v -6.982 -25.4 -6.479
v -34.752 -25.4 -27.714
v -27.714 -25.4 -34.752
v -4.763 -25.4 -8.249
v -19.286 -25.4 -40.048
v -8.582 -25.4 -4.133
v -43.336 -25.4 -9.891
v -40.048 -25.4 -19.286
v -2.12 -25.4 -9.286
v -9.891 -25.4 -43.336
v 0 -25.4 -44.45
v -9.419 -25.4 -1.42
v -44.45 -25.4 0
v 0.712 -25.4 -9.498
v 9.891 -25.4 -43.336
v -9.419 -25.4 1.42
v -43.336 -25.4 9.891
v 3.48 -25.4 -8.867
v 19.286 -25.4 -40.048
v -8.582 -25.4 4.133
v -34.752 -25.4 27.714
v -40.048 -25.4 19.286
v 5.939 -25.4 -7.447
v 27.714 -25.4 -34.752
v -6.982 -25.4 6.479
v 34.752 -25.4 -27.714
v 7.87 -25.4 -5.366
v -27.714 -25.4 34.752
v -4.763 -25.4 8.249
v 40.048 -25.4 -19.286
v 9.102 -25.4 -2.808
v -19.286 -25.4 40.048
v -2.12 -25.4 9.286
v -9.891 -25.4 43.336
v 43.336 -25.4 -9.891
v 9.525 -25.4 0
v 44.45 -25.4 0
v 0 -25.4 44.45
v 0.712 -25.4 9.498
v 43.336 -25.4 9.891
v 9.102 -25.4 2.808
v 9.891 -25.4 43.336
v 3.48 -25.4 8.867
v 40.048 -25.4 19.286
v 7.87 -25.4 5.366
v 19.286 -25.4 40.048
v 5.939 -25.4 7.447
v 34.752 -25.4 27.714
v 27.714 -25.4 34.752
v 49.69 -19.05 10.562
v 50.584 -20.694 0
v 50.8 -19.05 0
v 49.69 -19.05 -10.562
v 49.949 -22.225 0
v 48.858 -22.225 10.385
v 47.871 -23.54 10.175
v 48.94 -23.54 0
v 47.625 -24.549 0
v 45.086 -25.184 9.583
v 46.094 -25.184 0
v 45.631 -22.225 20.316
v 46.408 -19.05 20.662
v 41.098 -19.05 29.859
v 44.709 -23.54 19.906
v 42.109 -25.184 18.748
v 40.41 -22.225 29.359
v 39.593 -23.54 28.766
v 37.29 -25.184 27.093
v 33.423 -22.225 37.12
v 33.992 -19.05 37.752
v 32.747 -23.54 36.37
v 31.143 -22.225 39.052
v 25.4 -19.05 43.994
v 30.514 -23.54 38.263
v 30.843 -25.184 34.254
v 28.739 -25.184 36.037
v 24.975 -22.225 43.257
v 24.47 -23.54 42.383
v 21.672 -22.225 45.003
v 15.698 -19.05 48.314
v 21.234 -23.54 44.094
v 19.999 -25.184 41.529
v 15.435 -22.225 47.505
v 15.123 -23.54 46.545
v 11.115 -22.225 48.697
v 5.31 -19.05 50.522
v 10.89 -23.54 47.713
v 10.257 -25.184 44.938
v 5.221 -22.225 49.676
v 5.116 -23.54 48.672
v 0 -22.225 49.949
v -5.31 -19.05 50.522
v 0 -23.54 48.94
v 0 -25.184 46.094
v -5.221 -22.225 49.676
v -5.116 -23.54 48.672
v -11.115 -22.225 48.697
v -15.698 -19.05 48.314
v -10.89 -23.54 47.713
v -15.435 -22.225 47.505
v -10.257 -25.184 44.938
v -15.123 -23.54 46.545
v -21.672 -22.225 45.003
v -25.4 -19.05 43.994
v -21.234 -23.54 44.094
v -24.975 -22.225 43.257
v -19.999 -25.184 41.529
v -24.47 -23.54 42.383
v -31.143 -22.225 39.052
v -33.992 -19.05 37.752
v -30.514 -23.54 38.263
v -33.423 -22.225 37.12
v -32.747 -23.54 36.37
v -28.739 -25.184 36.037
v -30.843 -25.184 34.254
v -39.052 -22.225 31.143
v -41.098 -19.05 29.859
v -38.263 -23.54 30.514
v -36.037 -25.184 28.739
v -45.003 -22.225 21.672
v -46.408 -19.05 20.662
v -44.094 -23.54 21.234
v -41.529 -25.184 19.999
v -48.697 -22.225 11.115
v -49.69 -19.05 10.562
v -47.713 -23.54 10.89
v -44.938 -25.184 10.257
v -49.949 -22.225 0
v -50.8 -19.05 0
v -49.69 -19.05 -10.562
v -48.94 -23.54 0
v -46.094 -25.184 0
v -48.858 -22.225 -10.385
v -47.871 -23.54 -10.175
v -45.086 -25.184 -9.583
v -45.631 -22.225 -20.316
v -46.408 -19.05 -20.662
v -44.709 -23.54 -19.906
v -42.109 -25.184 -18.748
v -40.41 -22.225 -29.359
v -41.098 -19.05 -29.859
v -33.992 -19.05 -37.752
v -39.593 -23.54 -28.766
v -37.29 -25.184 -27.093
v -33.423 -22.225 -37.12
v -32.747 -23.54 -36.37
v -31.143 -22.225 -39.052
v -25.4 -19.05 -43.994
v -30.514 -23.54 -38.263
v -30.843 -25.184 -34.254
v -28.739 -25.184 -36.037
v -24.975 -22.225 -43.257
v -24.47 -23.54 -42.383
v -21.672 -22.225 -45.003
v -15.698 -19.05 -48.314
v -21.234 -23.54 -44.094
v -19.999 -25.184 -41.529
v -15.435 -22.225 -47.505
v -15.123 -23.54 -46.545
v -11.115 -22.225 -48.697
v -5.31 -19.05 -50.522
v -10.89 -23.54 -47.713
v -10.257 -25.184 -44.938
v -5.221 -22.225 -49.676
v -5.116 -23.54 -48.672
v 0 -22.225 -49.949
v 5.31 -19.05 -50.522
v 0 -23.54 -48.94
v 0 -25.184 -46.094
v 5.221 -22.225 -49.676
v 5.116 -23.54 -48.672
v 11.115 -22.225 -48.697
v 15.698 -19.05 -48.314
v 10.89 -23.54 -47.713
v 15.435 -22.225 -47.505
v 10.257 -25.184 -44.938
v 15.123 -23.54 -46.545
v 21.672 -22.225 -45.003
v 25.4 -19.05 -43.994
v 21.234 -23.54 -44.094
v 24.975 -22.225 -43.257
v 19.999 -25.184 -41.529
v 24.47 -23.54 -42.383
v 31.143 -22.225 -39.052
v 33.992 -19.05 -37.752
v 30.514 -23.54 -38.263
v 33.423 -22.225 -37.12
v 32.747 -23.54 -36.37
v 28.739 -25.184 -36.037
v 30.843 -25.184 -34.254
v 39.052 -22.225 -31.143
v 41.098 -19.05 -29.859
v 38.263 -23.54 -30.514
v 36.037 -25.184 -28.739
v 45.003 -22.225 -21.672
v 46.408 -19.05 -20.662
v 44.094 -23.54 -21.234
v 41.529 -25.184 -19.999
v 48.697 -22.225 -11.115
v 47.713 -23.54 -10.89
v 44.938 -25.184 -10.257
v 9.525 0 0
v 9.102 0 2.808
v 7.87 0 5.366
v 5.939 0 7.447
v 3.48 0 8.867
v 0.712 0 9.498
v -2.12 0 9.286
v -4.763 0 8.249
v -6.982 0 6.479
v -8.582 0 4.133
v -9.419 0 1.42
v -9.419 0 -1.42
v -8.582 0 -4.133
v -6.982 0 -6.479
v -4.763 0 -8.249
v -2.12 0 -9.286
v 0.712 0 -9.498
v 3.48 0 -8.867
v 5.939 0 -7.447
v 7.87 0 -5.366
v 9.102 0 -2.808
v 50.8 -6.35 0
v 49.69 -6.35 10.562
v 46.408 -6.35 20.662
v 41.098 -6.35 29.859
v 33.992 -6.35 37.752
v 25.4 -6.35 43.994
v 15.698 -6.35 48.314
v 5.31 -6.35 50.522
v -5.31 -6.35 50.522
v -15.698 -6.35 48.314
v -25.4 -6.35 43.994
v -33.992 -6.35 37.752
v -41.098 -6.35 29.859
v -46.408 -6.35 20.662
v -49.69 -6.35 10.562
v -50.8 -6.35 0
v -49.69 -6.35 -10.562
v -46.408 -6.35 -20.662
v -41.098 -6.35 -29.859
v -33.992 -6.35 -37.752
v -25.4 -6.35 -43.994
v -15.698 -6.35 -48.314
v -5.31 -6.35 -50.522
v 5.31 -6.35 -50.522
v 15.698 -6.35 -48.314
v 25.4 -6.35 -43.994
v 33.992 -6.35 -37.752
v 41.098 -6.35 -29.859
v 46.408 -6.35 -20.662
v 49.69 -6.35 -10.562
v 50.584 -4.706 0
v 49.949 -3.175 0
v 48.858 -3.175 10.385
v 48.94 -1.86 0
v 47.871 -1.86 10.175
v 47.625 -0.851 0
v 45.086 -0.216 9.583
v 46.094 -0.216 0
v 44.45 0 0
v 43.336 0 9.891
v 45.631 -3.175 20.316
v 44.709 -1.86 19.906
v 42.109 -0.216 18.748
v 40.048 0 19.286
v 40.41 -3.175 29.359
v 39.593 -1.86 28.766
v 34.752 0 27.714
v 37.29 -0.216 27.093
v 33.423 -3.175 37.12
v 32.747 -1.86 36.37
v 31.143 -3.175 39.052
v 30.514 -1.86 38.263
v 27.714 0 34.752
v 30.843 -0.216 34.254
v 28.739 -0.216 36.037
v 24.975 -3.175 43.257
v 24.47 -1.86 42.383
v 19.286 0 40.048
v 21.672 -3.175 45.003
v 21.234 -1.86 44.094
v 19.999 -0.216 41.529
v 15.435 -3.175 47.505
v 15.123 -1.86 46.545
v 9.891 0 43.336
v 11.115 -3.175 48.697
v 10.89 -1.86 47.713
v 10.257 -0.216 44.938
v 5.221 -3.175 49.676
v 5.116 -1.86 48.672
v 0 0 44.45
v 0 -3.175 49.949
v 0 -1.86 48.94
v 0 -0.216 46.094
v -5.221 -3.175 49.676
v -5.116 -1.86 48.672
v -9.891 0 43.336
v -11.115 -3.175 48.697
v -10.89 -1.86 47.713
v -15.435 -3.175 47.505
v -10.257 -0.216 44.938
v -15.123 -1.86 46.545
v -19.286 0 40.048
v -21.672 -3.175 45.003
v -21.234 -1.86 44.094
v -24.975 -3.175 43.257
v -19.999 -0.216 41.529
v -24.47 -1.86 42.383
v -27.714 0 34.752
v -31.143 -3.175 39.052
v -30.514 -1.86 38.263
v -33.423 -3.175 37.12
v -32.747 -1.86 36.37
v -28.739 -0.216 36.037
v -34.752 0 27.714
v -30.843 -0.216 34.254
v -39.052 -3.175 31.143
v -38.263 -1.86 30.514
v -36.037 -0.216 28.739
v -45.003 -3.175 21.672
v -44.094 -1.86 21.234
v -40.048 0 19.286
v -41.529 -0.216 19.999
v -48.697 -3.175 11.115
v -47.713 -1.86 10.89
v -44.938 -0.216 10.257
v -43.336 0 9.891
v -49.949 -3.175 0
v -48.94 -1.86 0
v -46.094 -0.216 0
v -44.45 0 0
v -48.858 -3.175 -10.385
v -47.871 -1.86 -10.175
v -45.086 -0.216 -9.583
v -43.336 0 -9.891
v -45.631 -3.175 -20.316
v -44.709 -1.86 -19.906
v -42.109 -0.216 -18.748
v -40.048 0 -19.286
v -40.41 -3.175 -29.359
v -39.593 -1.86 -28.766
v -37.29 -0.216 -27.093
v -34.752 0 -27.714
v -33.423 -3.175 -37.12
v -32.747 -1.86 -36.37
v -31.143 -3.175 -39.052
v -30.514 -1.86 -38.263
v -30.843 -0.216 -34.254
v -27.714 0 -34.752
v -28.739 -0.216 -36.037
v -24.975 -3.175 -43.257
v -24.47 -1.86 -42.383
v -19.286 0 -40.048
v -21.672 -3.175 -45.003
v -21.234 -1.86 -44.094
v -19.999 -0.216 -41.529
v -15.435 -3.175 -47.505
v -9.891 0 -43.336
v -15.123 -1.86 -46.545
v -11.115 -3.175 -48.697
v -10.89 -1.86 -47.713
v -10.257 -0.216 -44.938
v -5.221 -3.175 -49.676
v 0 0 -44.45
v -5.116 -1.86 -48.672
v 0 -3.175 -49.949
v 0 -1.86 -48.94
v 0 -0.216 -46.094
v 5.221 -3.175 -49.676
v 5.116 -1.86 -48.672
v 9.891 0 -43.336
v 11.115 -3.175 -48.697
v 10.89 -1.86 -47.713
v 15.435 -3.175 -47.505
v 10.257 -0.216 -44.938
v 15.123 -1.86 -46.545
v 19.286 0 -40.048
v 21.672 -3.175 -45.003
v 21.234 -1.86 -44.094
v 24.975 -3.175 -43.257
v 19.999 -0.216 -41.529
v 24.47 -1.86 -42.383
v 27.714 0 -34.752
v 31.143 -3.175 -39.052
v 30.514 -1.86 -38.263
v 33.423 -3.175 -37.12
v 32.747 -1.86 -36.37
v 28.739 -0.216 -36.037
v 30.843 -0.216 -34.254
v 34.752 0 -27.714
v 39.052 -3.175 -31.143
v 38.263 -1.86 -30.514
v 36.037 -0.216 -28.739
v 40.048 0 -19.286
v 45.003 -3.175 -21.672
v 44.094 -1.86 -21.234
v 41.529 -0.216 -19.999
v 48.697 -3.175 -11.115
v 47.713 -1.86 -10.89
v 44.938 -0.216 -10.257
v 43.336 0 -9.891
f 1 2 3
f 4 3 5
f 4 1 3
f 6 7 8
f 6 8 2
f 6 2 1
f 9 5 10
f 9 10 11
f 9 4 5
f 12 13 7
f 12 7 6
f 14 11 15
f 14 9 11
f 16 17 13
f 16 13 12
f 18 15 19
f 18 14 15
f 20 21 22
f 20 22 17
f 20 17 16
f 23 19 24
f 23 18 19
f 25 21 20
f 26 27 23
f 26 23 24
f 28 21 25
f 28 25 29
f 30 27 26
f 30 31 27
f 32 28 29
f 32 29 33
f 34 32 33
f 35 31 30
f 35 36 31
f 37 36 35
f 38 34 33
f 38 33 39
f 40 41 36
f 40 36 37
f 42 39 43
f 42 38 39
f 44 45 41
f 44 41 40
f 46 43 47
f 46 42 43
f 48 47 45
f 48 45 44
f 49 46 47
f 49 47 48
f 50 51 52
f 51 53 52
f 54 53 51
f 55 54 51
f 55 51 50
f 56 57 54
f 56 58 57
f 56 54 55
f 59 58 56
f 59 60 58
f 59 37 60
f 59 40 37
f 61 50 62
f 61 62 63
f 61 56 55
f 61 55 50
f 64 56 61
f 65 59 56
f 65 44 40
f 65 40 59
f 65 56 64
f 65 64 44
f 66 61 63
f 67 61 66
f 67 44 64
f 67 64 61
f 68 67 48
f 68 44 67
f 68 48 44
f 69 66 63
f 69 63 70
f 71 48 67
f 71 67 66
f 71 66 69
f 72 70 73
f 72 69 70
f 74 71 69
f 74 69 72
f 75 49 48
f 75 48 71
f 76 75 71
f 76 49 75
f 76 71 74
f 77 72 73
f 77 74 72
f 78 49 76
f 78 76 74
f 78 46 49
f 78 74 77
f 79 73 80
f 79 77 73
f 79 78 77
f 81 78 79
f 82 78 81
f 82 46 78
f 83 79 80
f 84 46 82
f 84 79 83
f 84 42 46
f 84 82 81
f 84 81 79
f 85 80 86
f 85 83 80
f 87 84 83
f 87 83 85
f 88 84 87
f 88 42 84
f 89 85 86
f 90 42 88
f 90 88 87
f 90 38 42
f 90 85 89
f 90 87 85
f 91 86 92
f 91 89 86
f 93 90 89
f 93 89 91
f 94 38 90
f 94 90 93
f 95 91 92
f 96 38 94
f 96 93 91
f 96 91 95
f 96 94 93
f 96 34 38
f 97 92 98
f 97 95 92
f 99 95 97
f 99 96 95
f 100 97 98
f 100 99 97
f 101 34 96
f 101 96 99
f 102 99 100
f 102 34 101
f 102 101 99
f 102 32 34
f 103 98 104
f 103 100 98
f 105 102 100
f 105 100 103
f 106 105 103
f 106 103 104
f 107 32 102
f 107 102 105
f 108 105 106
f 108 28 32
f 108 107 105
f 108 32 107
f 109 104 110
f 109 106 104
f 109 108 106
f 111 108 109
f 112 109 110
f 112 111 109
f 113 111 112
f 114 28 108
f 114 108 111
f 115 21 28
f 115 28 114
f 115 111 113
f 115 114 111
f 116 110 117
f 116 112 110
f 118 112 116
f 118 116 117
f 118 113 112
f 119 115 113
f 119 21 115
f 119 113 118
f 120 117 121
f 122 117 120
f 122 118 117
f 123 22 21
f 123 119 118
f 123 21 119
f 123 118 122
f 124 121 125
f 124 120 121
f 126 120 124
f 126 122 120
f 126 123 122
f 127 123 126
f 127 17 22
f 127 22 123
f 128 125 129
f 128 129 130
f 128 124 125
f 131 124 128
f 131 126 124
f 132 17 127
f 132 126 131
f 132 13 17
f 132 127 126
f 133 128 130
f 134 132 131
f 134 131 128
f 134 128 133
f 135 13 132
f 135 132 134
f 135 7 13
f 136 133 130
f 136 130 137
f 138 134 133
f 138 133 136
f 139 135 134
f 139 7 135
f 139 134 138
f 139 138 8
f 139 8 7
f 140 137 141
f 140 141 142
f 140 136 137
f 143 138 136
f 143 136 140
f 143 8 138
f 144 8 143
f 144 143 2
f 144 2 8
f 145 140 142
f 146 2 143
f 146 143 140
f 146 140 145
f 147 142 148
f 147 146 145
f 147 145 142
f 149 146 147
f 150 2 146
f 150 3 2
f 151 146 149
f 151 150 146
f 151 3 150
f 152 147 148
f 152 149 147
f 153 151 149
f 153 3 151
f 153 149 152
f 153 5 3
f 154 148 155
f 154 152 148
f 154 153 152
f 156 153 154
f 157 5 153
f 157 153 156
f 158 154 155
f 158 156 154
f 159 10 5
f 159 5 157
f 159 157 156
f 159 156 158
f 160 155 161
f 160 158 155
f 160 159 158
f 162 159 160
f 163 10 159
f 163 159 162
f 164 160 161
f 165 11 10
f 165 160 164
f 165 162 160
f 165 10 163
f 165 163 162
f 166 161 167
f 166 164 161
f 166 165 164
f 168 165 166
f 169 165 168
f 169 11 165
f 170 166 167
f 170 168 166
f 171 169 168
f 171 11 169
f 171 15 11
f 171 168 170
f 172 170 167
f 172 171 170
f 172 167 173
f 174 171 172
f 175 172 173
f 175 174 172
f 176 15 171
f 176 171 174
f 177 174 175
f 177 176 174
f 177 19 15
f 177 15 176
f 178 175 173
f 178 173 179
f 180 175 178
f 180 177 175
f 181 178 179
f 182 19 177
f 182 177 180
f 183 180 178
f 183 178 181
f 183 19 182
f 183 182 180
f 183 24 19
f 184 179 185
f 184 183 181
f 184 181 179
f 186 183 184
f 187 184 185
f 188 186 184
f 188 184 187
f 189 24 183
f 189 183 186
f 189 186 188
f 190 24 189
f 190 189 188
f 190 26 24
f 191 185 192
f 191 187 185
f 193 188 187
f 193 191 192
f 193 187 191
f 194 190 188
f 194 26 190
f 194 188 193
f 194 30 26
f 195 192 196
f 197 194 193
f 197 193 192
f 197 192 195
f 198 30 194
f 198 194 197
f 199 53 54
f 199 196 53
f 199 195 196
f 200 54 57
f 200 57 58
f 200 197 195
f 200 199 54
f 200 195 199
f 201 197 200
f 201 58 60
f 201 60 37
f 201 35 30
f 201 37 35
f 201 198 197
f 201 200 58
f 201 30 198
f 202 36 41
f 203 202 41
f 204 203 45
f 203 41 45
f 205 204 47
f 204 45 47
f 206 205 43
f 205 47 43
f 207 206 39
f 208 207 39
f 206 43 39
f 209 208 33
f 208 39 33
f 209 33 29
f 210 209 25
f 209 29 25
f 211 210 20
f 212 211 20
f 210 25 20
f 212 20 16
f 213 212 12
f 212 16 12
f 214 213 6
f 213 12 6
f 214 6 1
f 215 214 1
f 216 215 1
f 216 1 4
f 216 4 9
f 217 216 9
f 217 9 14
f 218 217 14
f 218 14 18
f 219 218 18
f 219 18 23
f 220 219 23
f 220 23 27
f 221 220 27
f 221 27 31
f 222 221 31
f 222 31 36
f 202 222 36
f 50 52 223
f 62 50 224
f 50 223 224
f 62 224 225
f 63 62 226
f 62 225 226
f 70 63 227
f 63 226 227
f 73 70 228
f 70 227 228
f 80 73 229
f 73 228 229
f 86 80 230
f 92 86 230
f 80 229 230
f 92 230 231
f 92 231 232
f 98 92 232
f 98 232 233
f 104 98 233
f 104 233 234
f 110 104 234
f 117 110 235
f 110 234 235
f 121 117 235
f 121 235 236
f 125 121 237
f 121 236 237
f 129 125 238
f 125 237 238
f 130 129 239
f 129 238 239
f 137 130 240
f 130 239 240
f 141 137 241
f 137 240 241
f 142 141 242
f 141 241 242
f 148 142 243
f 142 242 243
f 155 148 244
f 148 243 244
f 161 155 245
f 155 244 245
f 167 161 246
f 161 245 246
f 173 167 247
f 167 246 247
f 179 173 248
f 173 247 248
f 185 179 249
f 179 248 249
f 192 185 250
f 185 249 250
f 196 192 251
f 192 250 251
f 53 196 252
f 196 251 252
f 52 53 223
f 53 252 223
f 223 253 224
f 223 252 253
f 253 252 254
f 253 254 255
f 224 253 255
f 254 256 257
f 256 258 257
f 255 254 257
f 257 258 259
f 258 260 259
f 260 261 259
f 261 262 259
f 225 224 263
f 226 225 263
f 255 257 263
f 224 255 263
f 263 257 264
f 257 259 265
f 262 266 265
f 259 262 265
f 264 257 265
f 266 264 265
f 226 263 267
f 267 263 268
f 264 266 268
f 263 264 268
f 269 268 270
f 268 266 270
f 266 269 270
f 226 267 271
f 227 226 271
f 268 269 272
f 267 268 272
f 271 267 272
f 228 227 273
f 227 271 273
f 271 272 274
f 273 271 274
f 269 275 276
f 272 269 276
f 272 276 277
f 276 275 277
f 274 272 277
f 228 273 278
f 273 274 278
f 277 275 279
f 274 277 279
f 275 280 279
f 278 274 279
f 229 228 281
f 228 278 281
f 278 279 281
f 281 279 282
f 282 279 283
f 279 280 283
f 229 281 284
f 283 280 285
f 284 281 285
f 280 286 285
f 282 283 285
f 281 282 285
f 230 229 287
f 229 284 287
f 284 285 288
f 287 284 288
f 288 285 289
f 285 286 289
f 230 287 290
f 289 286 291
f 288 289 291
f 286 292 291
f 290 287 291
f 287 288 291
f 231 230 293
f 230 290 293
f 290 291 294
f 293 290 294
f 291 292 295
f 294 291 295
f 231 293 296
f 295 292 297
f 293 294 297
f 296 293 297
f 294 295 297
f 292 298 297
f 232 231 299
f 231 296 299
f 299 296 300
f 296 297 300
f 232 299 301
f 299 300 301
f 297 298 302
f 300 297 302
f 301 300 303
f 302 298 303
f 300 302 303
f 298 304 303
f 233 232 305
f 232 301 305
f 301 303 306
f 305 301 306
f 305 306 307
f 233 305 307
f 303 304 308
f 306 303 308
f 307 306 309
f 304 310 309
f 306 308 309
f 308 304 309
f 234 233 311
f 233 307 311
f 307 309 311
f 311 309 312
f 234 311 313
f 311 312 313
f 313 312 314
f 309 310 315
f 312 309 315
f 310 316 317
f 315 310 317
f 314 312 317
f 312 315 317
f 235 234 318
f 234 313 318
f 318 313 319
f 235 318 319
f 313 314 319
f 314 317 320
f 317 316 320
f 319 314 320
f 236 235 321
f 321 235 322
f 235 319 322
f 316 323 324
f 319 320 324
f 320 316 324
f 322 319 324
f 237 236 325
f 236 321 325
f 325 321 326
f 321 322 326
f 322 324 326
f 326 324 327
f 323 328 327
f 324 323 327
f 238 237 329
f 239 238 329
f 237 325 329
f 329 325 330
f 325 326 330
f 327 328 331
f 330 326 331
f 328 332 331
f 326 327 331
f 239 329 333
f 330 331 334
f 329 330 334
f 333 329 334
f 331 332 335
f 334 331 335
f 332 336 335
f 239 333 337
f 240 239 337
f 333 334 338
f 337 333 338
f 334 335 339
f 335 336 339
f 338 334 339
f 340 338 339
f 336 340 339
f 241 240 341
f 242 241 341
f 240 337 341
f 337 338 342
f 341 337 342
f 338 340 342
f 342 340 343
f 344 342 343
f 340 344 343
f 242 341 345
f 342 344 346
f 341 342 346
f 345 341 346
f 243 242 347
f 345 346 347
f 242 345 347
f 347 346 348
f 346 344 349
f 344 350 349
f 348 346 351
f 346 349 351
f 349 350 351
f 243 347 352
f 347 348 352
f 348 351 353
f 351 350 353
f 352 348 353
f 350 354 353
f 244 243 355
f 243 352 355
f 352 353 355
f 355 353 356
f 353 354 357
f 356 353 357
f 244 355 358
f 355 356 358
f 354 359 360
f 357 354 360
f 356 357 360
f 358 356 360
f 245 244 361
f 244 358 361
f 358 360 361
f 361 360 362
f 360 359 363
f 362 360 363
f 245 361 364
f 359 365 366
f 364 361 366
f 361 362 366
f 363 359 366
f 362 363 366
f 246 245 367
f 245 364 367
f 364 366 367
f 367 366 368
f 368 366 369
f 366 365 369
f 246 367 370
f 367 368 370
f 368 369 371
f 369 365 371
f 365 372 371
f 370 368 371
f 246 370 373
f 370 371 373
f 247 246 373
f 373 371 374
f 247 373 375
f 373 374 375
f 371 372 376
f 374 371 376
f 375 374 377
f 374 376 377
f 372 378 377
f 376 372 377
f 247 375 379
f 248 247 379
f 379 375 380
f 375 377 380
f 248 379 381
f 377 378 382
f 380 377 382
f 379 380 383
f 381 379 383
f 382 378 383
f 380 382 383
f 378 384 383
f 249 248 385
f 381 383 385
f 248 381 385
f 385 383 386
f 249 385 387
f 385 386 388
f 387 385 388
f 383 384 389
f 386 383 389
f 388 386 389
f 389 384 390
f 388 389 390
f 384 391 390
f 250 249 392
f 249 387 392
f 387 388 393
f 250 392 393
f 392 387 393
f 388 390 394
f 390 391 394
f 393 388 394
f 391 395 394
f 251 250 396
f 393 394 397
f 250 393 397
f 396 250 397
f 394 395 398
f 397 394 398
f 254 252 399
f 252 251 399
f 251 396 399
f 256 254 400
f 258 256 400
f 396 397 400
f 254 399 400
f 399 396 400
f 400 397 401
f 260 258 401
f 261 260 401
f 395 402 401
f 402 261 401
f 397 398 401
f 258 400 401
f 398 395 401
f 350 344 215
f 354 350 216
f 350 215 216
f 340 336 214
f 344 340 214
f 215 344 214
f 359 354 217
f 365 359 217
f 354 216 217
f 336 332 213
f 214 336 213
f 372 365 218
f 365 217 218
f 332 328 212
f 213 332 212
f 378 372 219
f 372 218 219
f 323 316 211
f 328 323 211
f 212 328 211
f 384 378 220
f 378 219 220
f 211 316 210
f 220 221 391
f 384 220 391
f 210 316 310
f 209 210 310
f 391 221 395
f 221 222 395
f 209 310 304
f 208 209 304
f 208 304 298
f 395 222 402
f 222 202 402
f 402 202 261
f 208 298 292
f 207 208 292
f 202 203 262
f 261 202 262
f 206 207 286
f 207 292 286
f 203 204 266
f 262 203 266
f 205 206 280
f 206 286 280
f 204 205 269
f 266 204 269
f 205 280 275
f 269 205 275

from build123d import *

# Parameters (mm, degrees)
F0_R     = 50.8
F1_DEPTH = 25.4
F2_R     = 9.525
F3_DEPTH = 25.401
F4_R     = 6.35


with BuildPart() as f1:
    # F0 (on Front) → F1 (new body)
    with BuildSketch(Plane.XZ):
        Circle(F0_R)
    extrude(amount=F1_DEPTH)

    # F2 (on face) → F3 (cut, through all)
    with BuildSketch(Plane.XZ.offset(25.4)):
        Circle(F2_R)
    extrude(amount=-F3_DEPTH, mode=Mode.SUBTRACT)

    # F4
    f4_edges = [f1.edges().sort_by_distance(p)[0] for p in [
        (-50.8, -25.4, 0),
        (-50.8, 0, 0),
    ]]
    fillet(f4_edges, radius=F4_R)


solid = f1.part
